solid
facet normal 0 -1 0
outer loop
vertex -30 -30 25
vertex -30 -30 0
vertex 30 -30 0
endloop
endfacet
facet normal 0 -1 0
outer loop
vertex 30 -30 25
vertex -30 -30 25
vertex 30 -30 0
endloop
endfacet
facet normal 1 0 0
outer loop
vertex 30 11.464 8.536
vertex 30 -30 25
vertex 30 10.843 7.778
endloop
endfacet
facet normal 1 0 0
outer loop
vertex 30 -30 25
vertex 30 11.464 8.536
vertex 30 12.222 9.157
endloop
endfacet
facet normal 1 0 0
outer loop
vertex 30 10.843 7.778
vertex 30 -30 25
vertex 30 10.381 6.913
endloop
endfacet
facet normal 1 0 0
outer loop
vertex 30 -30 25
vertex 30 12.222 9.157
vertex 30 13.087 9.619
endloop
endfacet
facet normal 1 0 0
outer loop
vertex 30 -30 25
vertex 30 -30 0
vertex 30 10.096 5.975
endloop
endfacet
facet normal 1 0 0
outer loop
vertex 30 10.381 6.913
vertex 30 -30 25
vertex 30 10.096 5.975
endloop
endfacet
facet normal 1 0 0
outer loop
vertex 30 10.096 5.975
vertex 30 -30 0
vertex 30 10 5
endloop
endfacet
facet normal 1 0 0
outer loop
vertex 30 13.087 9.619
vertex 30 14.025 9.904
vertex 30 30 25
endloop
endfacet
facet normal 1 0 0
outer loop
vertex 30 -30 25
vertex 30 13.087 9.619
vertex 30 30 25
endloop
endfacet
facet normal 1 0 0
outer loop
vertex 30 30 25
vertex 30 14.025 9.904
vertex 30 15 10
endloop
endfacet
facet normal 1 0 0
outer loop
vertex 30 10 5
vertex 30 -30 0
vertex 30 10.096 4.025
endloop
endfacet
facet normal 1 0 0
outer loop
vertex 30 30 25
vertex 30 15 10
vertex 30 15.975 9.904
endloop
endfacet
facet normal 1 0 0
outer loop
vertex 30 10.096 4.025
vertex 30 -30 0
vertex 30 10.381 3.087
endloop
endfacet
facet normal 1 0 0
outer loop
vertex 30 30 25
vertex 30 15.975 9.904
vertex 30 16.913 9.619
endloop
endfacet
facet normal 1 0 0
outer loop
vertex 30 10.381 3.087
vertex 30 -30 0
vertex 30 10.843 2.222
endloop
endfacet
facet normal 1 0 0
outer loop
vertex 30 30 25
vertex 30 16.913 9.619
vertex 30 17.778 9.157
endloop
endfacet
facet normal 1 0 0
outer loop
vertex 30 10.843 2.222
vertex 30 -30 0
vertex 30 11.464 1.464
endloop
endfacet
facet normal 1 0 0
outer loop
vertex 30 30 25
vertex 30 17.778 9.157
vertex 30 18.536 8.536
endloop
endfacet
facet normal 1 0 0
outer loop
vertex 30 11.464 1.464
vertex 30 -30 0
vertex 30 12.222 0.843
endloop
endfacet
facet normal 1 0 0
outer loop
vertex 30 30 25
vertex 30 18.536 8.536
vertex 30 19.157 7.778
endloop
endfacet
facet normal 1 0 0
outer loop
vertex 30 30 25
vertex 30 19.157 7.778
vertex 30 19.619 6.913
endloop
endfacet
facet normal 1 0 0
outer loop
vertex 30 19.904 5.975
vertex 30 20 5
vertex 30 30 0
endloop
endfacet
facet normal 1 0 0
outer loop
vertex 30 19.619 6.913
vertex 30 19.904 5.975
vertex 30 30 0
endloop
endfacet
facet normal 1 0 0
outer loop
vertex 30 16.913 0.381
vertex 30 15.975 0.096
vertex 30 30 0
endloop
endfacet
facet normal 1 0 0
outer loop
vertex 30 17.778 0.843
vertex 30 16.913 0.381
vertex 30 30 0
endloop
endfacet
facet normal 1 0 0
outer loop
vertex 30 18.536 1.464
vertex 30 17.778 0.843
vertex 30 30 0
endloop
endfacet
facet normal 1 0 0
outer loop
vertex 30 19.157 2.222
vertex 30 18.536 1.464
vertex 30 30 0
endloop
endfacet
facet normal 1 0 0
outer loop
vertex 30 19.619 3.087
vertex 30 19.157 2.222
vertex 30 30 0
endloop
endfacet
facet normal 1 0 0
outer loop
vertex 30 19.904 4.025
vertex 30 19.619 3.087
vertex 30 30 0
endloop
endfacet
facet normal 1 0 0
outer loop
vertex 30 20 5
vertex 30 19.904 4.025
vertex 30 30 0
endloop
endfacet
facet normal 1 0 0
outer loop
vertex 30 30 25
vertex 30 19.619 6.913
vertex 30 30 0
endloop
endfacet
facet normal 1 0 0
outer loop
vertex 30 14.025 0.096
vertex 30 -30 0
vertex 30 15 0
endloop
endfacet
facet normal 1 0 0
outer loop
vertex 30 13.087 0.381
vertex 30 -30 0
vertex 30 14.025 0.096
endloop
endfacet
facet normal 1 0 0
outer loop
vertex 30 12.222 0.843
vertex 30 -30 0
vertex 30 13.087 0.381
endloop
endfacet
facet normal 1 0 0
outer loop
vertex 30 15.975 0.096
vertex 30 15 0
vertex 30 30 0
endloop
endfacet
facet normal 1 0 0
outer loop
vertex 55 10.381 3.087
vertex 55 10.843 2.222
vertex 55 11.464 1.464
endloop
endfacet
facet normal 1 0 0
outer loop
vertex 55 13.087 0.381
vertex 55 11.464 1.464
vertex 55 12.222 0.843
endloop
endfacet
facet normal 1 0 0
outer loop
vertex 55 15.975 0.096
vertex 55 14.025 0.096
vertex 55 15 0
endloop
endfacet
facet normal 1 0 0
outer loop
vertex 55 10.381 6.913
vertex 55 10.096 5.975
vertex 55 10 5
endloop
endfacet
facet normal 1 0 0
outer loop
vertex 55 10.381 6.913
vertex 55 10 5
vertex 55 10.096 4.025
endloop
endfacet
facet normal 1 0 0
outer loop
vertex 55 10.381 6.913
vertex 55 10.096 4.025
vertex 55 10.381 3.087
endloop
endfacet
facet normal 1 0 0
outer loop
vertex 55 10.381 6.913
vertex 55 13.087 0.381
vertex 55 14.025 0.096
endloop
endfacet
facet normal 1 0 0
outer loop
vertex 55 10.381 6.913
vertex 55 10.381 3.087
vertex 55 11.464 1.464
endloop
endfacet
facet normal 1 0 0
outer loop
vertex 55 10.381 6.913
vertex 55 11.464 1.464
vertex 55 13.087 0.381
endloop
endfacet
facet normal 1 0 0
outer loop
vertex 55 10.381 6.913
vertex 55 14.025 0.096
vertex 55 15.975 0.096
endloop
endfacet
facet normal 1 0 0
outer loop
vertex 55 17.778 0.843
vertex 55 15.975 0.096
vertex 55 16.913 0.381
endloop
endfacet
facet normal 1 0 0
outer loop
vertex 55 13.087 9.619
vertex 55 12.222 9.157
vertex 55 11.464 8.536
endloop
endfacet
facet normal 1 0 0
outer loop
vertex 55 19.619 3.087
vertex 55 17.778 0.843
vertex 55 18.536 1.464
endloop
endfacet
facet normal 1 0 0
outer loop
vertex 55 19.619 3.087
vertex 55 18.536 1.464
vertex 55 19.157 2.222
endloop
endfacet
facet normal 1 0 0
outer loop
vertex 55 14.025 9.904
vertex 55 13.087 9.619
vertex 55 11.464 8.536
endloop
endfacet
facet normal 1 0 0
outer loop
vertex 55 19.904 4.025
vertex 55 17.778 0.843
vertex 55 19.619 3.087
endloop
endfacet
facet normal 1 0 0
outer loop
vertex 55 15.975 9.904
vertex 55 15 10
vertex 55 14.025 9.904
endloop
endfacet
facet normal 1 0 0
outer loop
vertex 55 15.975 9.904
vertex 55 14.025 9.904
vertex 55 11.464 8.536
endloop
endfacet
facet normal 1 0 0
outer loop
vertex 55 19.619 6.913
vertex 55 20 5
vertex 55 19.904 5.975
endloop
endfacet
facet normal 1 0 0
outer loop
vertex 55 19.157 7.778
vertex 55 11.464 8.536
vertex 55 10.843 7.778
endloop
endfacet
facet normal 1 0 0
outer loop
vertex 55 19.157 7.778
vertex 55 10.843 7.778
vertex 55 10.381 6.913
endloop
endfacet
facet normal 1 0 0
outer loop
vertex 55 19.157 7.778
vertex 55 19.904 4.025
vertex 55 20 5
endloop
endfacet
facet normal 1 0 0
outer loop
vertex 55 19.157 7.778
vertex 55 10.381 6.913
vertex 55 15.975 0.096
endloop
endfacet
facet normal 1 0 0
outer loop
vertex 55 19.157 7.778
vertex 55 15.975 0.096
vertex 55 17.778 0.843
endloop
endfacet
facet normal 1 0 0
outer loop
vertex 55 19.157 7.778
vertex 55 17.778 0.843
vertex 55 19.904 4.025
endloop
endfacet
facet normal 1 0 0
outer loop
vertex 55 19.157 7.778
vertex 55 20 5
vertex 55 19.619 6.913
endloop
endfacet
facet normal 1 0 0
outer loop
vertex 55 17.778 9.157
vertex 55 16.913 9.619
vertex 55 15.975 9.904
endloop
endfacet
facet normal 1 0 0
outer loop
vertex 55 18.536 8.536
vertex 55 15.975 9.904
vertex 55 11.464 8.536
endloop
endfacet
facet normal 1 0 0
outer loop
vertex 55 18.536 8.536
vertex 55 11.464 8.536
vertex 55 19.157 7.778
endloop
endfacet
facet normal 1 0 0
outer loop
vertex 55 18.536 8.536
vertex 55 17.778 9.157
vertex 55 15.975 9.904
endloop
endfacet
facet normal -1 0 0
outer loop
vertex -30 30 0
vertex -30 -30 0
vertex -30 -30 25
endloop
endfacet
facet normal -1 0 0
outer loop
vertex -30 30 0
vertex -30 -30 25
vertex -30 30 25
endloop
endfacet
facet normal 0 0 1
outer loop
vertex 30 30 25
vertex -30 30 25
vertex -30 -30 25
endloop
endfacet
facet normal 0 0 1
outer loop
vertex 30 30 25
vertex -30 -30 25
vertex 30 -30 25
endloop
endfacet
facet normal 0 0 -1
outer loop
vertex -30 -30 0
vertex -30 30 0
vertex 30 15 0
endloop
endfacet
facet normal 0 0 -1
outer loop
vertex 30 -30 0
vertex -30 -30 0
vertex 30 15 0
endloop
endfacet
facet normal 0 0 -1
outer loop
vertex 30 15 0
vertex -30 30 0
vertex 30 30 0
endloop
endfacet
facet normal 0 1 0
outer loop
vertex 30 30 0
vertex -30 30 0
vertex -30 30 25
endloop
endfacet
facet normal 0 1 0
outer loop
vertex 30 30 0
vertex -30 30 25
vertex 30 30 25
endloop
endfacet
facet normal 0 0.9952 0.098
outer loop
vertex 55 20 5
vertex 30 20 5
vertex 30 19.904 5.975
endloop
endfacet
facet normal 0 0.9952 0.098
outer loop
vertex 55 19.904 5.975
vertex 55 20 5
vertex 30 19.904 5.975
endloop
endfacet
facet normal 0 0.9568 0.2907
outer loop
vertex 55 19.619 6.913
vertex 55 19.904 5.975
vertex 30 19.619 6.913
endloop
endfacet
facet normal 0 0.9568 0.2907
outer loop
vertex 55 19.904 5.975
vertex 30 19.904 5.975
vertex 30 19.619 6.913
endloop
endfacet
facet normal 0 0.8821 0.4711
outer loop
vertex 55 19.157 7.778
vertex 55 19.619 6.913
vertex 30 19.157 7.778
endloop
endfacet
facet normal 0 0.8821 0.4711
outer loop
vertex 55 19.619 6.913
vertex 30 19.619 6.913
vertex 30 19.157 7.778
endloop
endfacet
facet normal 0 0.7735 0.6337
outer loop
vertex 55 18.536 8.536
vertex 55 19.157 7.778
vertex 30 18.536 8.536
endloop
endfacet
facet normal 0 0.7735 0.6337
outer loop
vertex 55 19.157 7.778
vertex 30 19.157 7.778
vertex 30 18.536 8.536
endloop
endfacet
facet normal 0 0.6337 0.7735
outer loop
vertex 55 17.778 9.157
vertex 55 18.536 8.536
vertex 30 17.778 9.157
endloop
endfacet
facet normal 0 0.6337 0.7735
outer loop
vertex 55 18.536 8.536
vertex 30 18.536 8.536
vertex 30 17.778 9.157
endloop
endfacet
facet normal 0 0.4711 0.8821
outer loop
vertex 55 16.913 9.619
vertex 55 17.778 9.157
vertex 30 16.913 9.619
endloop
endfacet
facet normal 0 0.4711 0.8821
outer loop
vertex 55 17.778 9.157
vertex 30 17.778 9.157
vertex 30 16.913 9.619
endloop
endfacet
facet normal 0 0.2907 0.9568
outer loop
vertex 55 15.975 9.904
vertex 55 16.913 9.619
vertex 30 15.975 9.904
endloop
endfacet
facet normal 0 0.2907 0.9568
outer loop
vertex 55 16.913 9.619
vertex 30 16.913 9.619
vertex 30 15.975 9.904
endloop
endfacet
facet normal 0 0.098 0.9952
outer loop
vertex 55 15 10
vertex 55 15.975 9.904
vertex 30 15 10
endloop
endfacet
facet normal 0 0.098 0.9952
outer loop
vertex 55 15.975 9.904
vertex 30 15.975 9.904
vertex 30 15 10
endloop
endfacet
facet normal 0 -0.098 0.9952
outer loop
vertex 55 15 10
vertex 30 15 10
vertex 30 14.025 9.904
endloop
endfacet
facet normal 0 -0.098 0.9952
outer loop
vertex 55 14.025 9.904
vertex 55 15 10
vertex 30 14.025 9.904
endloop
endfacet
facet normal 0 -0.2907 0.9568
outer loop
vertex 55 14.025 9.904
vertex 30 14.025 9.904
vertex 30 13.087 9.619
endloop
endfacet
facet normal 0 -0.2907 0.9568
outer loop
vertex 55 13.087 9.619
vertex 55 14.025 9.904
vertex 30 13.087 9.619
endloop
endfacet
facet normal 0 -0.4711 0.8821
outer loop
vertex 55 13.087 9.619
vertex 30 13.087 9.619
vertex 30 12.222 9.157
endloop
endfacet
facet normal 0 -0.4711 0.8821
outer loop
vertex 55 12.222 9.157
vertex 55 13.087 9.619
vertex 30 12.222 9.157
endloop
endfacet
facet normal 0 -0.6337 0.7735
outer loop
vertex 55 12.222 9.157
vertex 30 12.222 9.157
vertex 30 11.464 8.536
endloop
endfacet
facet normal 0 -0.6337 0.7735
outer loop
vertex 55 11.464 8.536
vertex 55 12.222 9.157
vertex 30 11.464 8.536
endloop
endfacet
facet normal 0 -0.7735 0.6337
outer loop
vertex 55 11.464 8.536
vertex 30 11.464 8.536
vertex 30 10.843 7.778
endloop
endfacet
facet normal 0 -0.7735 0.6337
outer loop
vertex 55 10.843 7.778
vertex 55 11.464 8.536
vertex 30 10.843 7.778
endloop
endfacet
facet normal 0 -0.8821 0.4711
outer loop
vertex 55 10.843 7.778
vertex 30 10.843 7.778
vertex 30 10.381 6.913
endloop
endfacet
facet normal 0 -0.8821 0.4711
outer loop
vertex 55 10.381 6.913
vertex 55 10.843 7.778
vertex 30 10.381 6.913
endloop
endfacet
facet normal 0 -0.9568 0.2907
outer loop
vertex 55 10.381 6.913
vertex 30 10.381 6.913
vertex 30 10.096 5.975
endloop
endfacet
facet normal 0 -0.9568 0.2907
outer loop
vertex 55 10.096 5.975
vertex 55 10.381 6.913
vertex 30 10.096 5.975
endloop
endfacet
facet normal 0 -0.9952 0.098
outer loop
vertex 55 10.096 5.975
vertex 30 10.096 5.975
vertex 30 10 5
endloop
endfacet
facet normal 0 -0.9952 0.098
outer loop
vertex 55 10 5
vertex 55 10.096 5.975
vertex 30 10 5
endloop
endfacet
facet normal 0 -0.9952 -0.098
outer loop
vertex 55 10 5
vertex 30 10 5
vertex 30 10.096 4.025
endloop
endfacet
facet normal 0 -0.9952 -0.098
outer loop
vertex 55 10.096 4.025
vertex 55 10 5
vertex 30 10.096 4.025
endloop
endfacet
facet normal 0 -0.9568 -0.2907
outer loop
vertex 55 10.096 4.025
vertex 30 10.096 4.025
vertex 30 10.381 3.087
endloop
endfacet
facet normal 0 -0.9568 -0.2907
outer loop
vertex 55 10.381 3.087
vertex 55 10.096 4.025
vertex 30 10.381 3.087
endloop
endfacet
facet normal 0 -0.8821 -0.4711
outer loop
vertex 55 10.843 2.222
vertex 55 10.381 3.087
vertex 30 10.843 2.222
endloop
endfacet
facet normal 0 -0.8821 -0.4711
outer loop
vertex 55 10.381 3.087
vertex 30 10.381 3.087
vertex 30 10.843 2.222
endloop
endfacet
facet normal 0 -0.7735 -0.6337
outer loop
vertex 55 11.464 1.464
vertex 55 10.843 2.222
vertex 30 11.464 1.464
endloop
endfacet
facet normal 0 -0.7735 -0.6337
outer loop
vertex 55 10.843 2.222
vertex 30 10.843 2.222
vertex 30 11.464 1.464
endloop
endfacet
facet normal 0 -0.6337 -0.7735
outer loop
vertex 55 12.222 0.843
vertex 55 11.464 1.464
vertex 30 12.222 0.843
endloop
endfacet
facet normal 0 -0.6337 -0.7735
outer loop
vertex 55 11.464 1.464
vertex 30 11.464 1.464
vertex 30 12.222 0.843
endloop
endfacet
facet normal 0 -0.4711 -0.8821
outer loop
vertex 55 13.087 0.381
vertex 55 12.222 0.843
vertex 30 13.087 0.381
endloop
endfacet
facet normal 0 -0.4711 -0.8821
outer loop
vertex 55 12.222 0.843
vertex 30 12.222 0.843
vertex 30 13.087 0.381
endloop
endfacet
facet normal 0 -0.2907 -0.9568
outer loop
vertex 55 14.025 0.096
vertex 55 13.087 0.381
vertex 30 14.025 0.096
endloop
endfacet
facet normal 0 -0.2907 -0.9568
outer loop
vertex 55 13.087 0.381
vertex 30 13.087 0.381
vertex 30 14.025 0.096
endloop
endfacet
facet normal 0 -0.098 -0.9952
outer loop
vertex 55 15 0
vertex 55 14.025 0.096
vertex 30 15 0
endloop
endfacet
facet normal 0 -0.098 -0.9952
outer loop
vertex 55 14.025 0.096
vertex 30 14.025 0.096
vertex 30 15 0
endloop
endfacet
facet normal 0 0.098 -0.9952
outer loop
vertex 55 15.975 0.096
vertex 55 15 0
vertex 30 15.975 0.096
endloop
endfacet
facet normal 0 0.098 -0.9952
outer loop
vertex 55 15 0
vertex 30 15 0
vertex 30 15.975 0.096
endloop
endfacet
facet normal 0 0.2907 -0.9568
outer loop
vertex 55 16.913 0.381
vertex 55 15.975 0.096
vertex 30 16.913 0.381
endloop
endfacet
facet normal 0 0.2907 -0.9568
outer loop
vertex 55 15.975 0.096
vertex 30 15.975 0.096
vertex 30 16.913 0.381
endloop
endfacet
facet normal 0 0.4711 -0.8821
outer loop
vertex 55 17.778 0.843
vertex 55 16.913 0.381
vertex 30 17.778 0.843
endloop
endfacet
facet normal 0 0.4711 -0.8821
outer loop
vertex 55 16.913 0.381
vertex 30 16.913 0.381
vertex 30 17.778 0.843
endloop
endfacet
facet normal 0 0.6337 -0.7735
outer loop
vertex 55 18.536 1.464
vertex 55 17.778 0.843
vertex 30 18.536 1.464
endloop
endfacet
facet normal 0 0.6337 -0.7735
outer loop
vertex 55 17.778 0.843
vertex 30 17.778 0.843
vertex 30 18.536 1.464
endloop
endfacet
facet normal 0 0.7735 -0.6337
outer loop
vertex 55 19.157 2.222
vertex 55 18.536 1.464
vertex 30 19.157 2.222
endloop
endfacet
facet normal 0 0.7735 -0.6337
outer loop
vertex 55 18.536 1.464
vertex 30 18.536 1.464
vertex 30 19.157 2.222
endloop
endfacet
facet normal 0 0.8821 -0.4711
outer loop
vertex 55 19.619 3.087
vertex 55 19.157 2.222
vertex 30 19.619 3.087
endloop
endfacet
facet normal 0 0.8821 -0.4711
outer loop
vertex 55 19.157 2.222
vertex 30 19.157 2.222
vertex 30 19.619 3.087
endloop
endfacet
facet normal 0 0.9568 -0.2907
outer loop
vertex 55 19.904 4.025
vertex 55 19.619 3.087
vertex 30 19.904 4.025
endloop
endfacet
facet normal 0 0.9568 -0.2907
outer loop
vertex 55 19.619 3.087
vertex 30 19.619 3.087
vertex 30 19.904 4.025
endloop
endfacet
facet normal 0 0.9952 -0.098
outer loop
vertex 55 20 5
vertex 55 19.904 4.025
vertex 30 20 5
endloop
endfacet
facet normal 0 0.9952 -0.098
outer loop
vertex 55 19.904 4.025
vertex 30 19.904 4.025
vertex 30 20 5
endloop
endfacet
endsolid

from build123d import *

# Parameters (mm, degrees)
F0_W     = 60
F0_H     = 60
F1_DEPTH = 25
F2_R     = 5
F3_DEPTH = 25


with BuildPart() as f1:
    # F0 (on Top) → F1 (new body)
    with BuildSketch(Plane.XY):
        Rectangle(F0_W, F0_H)
    extrude(amount=F1_DEPTH)

    # F2 (on face) → F3 (join)
    with BuildSketch(Plane.YZ.offset(30)):
        with Locations((15, 5)):
            Circle(F2_R)
    extrude(amount=F3_DEPTH)


solid = f1.part
